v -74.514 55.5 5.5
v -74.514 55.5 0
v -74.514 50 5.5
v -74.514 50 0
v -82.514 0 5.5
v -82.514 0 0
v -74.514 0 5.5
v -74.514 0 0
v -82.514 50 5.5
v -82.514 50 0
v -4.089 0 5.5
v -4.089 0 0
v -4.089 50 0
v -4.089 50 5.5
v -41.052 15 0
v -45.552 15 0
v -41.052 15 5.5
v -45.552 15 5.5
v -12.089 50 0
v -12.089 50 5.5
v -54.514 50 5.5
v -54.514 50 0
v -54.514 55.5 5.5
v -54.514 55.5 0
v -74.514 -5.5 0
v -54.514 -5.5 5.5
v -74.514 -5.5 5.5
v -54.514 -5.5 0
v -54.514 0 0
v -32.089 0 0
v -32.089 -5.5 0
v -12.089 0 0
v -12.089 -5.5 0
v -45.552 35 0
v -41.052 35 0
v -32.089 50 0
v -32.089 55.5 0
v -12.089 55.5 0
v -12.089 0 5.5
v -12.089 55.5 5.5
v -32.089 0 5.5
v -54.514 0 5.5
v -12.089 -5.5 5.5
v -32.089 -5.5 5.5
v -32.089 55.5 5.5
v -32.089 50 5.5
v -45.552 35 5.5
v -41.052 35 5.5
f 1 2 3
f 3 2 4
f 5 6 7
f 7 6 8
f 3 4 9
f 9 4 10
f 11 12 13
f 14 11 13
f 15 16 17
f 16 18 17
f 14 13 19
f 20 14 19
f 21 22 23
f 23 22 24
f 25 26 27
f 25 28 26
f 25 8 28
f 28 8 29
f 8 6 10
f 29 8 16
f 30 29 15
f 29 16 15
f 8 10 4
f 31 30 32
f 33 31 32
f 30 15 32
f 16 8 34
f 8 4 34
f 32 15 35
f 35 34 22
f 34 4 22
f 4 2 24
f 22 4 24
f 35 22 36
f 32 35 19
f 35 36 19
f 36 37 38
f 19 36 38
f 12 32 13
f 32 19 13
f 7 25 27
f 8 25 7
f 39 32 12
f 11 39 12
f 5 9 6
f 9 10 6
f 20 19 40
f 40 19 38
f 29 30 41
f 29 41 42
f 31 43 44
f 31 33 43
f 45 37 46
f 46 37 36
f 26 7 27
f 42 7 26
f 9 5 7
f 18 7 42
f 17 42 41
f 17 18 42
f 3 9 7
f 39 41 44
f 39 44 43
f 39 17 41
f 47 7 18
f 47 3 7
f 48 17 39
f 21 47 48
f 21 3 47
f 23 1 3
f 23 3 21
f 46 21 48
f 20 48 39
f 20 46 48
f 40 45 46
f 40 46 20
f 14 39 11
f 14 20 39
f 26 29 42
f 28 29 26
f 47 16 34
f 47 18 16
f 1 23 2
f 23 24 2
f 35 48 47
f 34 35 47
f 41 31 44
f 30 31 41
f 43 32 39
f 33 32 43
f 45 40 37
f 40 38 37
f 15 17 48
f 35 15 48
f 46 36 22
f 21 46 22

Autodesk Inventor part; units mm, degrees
ref_plane "YZ Plane" through (0, 0, 0) normal (1, 0, 0) x (0, 1, 0)
ref_plane "XZ Plane" through (0, 0, 0) normal (0, 1, 0) x (-1, 0, 0)
ref_plane "XY Plane" through (0, 0, 0) normal (0, 0, 1) x (1, 0, 0)
sketch "Sketch1" plane through (0, 0, 0) normal (0, 0, 1) x (1, 0, 0)
  line L0 (-12.089, 0) -> (-12.089, -5.5)
  line L1 (-12.089, -5.5) -> (-32.089, -5.5)
  line L2 (-32.089, -5.5) -> (-32.089, 0)
  line L3 (-54.514, 0) -> (-54.514, -5.5)
  line L4 (-54.514, -5.5) -> (-74.514, -5.5)
  line L5 (-74.514, -5.5) -> (-74.514, 0)
  line L6 (-32.089, 0) -> (-54.514, 0)
  line L7 (-12.089, 50) -> (-12.089, 55.5)
  line L8 (-12.089, 55.5) -> (-32.089, 55.5)
  line L9 (-32.089, 55.5) -> (-32.089, 50)
  line L10 (-54.514, 50) -> (-54.514, 55.5)
  line L11 (-54.514, 55.5) -> (-74.514, 55.5)
  line L12 (-74.514, 55.5) -> (-74.514, 50)
  line L13 (-32.089, 50) -> (-54.514, 50)
  line L14 (-12.089, 0) -> (-4.089, 0)
  line L15 (-4.089, 0) -> (-4.089, 50)
  line L16 (-4.089, 50) -> (-12.089, 50)
  line L17 (-74.514, 50) -> (-82.514, 50)
  line L18 (-82.514, 50) -> (-82.514, 0)
  line L19 (-82.514, 0) -> (-74.514, 0)
  dimension "d2" = 5.5
  dimension "d3" = 20
  dimension "d4" = 5.5
  dimension "d5" = 20
  dimension "d6" = 90
  dimension "d18" = 8
  dimension "d20" = 8
extrude "Extrusion1" add sketch "Sketch1" along normal blind 5.5
sketch "Sketch2" plane through (0, 0, 5.5) normal (0, 0, 1) x (1, 0, 0)
  line L0 (-43.3015, 15) -> (-45.5515, 15)
  line L1 (-45.5515, 15) -> (-45.5515, 35)
  line L2 (-45.5515, 35) -> (-43.3015, 35)
  line L3 (-43.3015, 15) -> (-41.0515, 15)
  line L4 (-41.0515, 15) -> (-41.0515, 35)
  line L5 (-41.0515, 35) -> (-43.3015, 35)
  point P0 (0, 0)
extrude "Extrusion2" cut sketch "Sketch2" against normal blind 10
properties part number "lado"
